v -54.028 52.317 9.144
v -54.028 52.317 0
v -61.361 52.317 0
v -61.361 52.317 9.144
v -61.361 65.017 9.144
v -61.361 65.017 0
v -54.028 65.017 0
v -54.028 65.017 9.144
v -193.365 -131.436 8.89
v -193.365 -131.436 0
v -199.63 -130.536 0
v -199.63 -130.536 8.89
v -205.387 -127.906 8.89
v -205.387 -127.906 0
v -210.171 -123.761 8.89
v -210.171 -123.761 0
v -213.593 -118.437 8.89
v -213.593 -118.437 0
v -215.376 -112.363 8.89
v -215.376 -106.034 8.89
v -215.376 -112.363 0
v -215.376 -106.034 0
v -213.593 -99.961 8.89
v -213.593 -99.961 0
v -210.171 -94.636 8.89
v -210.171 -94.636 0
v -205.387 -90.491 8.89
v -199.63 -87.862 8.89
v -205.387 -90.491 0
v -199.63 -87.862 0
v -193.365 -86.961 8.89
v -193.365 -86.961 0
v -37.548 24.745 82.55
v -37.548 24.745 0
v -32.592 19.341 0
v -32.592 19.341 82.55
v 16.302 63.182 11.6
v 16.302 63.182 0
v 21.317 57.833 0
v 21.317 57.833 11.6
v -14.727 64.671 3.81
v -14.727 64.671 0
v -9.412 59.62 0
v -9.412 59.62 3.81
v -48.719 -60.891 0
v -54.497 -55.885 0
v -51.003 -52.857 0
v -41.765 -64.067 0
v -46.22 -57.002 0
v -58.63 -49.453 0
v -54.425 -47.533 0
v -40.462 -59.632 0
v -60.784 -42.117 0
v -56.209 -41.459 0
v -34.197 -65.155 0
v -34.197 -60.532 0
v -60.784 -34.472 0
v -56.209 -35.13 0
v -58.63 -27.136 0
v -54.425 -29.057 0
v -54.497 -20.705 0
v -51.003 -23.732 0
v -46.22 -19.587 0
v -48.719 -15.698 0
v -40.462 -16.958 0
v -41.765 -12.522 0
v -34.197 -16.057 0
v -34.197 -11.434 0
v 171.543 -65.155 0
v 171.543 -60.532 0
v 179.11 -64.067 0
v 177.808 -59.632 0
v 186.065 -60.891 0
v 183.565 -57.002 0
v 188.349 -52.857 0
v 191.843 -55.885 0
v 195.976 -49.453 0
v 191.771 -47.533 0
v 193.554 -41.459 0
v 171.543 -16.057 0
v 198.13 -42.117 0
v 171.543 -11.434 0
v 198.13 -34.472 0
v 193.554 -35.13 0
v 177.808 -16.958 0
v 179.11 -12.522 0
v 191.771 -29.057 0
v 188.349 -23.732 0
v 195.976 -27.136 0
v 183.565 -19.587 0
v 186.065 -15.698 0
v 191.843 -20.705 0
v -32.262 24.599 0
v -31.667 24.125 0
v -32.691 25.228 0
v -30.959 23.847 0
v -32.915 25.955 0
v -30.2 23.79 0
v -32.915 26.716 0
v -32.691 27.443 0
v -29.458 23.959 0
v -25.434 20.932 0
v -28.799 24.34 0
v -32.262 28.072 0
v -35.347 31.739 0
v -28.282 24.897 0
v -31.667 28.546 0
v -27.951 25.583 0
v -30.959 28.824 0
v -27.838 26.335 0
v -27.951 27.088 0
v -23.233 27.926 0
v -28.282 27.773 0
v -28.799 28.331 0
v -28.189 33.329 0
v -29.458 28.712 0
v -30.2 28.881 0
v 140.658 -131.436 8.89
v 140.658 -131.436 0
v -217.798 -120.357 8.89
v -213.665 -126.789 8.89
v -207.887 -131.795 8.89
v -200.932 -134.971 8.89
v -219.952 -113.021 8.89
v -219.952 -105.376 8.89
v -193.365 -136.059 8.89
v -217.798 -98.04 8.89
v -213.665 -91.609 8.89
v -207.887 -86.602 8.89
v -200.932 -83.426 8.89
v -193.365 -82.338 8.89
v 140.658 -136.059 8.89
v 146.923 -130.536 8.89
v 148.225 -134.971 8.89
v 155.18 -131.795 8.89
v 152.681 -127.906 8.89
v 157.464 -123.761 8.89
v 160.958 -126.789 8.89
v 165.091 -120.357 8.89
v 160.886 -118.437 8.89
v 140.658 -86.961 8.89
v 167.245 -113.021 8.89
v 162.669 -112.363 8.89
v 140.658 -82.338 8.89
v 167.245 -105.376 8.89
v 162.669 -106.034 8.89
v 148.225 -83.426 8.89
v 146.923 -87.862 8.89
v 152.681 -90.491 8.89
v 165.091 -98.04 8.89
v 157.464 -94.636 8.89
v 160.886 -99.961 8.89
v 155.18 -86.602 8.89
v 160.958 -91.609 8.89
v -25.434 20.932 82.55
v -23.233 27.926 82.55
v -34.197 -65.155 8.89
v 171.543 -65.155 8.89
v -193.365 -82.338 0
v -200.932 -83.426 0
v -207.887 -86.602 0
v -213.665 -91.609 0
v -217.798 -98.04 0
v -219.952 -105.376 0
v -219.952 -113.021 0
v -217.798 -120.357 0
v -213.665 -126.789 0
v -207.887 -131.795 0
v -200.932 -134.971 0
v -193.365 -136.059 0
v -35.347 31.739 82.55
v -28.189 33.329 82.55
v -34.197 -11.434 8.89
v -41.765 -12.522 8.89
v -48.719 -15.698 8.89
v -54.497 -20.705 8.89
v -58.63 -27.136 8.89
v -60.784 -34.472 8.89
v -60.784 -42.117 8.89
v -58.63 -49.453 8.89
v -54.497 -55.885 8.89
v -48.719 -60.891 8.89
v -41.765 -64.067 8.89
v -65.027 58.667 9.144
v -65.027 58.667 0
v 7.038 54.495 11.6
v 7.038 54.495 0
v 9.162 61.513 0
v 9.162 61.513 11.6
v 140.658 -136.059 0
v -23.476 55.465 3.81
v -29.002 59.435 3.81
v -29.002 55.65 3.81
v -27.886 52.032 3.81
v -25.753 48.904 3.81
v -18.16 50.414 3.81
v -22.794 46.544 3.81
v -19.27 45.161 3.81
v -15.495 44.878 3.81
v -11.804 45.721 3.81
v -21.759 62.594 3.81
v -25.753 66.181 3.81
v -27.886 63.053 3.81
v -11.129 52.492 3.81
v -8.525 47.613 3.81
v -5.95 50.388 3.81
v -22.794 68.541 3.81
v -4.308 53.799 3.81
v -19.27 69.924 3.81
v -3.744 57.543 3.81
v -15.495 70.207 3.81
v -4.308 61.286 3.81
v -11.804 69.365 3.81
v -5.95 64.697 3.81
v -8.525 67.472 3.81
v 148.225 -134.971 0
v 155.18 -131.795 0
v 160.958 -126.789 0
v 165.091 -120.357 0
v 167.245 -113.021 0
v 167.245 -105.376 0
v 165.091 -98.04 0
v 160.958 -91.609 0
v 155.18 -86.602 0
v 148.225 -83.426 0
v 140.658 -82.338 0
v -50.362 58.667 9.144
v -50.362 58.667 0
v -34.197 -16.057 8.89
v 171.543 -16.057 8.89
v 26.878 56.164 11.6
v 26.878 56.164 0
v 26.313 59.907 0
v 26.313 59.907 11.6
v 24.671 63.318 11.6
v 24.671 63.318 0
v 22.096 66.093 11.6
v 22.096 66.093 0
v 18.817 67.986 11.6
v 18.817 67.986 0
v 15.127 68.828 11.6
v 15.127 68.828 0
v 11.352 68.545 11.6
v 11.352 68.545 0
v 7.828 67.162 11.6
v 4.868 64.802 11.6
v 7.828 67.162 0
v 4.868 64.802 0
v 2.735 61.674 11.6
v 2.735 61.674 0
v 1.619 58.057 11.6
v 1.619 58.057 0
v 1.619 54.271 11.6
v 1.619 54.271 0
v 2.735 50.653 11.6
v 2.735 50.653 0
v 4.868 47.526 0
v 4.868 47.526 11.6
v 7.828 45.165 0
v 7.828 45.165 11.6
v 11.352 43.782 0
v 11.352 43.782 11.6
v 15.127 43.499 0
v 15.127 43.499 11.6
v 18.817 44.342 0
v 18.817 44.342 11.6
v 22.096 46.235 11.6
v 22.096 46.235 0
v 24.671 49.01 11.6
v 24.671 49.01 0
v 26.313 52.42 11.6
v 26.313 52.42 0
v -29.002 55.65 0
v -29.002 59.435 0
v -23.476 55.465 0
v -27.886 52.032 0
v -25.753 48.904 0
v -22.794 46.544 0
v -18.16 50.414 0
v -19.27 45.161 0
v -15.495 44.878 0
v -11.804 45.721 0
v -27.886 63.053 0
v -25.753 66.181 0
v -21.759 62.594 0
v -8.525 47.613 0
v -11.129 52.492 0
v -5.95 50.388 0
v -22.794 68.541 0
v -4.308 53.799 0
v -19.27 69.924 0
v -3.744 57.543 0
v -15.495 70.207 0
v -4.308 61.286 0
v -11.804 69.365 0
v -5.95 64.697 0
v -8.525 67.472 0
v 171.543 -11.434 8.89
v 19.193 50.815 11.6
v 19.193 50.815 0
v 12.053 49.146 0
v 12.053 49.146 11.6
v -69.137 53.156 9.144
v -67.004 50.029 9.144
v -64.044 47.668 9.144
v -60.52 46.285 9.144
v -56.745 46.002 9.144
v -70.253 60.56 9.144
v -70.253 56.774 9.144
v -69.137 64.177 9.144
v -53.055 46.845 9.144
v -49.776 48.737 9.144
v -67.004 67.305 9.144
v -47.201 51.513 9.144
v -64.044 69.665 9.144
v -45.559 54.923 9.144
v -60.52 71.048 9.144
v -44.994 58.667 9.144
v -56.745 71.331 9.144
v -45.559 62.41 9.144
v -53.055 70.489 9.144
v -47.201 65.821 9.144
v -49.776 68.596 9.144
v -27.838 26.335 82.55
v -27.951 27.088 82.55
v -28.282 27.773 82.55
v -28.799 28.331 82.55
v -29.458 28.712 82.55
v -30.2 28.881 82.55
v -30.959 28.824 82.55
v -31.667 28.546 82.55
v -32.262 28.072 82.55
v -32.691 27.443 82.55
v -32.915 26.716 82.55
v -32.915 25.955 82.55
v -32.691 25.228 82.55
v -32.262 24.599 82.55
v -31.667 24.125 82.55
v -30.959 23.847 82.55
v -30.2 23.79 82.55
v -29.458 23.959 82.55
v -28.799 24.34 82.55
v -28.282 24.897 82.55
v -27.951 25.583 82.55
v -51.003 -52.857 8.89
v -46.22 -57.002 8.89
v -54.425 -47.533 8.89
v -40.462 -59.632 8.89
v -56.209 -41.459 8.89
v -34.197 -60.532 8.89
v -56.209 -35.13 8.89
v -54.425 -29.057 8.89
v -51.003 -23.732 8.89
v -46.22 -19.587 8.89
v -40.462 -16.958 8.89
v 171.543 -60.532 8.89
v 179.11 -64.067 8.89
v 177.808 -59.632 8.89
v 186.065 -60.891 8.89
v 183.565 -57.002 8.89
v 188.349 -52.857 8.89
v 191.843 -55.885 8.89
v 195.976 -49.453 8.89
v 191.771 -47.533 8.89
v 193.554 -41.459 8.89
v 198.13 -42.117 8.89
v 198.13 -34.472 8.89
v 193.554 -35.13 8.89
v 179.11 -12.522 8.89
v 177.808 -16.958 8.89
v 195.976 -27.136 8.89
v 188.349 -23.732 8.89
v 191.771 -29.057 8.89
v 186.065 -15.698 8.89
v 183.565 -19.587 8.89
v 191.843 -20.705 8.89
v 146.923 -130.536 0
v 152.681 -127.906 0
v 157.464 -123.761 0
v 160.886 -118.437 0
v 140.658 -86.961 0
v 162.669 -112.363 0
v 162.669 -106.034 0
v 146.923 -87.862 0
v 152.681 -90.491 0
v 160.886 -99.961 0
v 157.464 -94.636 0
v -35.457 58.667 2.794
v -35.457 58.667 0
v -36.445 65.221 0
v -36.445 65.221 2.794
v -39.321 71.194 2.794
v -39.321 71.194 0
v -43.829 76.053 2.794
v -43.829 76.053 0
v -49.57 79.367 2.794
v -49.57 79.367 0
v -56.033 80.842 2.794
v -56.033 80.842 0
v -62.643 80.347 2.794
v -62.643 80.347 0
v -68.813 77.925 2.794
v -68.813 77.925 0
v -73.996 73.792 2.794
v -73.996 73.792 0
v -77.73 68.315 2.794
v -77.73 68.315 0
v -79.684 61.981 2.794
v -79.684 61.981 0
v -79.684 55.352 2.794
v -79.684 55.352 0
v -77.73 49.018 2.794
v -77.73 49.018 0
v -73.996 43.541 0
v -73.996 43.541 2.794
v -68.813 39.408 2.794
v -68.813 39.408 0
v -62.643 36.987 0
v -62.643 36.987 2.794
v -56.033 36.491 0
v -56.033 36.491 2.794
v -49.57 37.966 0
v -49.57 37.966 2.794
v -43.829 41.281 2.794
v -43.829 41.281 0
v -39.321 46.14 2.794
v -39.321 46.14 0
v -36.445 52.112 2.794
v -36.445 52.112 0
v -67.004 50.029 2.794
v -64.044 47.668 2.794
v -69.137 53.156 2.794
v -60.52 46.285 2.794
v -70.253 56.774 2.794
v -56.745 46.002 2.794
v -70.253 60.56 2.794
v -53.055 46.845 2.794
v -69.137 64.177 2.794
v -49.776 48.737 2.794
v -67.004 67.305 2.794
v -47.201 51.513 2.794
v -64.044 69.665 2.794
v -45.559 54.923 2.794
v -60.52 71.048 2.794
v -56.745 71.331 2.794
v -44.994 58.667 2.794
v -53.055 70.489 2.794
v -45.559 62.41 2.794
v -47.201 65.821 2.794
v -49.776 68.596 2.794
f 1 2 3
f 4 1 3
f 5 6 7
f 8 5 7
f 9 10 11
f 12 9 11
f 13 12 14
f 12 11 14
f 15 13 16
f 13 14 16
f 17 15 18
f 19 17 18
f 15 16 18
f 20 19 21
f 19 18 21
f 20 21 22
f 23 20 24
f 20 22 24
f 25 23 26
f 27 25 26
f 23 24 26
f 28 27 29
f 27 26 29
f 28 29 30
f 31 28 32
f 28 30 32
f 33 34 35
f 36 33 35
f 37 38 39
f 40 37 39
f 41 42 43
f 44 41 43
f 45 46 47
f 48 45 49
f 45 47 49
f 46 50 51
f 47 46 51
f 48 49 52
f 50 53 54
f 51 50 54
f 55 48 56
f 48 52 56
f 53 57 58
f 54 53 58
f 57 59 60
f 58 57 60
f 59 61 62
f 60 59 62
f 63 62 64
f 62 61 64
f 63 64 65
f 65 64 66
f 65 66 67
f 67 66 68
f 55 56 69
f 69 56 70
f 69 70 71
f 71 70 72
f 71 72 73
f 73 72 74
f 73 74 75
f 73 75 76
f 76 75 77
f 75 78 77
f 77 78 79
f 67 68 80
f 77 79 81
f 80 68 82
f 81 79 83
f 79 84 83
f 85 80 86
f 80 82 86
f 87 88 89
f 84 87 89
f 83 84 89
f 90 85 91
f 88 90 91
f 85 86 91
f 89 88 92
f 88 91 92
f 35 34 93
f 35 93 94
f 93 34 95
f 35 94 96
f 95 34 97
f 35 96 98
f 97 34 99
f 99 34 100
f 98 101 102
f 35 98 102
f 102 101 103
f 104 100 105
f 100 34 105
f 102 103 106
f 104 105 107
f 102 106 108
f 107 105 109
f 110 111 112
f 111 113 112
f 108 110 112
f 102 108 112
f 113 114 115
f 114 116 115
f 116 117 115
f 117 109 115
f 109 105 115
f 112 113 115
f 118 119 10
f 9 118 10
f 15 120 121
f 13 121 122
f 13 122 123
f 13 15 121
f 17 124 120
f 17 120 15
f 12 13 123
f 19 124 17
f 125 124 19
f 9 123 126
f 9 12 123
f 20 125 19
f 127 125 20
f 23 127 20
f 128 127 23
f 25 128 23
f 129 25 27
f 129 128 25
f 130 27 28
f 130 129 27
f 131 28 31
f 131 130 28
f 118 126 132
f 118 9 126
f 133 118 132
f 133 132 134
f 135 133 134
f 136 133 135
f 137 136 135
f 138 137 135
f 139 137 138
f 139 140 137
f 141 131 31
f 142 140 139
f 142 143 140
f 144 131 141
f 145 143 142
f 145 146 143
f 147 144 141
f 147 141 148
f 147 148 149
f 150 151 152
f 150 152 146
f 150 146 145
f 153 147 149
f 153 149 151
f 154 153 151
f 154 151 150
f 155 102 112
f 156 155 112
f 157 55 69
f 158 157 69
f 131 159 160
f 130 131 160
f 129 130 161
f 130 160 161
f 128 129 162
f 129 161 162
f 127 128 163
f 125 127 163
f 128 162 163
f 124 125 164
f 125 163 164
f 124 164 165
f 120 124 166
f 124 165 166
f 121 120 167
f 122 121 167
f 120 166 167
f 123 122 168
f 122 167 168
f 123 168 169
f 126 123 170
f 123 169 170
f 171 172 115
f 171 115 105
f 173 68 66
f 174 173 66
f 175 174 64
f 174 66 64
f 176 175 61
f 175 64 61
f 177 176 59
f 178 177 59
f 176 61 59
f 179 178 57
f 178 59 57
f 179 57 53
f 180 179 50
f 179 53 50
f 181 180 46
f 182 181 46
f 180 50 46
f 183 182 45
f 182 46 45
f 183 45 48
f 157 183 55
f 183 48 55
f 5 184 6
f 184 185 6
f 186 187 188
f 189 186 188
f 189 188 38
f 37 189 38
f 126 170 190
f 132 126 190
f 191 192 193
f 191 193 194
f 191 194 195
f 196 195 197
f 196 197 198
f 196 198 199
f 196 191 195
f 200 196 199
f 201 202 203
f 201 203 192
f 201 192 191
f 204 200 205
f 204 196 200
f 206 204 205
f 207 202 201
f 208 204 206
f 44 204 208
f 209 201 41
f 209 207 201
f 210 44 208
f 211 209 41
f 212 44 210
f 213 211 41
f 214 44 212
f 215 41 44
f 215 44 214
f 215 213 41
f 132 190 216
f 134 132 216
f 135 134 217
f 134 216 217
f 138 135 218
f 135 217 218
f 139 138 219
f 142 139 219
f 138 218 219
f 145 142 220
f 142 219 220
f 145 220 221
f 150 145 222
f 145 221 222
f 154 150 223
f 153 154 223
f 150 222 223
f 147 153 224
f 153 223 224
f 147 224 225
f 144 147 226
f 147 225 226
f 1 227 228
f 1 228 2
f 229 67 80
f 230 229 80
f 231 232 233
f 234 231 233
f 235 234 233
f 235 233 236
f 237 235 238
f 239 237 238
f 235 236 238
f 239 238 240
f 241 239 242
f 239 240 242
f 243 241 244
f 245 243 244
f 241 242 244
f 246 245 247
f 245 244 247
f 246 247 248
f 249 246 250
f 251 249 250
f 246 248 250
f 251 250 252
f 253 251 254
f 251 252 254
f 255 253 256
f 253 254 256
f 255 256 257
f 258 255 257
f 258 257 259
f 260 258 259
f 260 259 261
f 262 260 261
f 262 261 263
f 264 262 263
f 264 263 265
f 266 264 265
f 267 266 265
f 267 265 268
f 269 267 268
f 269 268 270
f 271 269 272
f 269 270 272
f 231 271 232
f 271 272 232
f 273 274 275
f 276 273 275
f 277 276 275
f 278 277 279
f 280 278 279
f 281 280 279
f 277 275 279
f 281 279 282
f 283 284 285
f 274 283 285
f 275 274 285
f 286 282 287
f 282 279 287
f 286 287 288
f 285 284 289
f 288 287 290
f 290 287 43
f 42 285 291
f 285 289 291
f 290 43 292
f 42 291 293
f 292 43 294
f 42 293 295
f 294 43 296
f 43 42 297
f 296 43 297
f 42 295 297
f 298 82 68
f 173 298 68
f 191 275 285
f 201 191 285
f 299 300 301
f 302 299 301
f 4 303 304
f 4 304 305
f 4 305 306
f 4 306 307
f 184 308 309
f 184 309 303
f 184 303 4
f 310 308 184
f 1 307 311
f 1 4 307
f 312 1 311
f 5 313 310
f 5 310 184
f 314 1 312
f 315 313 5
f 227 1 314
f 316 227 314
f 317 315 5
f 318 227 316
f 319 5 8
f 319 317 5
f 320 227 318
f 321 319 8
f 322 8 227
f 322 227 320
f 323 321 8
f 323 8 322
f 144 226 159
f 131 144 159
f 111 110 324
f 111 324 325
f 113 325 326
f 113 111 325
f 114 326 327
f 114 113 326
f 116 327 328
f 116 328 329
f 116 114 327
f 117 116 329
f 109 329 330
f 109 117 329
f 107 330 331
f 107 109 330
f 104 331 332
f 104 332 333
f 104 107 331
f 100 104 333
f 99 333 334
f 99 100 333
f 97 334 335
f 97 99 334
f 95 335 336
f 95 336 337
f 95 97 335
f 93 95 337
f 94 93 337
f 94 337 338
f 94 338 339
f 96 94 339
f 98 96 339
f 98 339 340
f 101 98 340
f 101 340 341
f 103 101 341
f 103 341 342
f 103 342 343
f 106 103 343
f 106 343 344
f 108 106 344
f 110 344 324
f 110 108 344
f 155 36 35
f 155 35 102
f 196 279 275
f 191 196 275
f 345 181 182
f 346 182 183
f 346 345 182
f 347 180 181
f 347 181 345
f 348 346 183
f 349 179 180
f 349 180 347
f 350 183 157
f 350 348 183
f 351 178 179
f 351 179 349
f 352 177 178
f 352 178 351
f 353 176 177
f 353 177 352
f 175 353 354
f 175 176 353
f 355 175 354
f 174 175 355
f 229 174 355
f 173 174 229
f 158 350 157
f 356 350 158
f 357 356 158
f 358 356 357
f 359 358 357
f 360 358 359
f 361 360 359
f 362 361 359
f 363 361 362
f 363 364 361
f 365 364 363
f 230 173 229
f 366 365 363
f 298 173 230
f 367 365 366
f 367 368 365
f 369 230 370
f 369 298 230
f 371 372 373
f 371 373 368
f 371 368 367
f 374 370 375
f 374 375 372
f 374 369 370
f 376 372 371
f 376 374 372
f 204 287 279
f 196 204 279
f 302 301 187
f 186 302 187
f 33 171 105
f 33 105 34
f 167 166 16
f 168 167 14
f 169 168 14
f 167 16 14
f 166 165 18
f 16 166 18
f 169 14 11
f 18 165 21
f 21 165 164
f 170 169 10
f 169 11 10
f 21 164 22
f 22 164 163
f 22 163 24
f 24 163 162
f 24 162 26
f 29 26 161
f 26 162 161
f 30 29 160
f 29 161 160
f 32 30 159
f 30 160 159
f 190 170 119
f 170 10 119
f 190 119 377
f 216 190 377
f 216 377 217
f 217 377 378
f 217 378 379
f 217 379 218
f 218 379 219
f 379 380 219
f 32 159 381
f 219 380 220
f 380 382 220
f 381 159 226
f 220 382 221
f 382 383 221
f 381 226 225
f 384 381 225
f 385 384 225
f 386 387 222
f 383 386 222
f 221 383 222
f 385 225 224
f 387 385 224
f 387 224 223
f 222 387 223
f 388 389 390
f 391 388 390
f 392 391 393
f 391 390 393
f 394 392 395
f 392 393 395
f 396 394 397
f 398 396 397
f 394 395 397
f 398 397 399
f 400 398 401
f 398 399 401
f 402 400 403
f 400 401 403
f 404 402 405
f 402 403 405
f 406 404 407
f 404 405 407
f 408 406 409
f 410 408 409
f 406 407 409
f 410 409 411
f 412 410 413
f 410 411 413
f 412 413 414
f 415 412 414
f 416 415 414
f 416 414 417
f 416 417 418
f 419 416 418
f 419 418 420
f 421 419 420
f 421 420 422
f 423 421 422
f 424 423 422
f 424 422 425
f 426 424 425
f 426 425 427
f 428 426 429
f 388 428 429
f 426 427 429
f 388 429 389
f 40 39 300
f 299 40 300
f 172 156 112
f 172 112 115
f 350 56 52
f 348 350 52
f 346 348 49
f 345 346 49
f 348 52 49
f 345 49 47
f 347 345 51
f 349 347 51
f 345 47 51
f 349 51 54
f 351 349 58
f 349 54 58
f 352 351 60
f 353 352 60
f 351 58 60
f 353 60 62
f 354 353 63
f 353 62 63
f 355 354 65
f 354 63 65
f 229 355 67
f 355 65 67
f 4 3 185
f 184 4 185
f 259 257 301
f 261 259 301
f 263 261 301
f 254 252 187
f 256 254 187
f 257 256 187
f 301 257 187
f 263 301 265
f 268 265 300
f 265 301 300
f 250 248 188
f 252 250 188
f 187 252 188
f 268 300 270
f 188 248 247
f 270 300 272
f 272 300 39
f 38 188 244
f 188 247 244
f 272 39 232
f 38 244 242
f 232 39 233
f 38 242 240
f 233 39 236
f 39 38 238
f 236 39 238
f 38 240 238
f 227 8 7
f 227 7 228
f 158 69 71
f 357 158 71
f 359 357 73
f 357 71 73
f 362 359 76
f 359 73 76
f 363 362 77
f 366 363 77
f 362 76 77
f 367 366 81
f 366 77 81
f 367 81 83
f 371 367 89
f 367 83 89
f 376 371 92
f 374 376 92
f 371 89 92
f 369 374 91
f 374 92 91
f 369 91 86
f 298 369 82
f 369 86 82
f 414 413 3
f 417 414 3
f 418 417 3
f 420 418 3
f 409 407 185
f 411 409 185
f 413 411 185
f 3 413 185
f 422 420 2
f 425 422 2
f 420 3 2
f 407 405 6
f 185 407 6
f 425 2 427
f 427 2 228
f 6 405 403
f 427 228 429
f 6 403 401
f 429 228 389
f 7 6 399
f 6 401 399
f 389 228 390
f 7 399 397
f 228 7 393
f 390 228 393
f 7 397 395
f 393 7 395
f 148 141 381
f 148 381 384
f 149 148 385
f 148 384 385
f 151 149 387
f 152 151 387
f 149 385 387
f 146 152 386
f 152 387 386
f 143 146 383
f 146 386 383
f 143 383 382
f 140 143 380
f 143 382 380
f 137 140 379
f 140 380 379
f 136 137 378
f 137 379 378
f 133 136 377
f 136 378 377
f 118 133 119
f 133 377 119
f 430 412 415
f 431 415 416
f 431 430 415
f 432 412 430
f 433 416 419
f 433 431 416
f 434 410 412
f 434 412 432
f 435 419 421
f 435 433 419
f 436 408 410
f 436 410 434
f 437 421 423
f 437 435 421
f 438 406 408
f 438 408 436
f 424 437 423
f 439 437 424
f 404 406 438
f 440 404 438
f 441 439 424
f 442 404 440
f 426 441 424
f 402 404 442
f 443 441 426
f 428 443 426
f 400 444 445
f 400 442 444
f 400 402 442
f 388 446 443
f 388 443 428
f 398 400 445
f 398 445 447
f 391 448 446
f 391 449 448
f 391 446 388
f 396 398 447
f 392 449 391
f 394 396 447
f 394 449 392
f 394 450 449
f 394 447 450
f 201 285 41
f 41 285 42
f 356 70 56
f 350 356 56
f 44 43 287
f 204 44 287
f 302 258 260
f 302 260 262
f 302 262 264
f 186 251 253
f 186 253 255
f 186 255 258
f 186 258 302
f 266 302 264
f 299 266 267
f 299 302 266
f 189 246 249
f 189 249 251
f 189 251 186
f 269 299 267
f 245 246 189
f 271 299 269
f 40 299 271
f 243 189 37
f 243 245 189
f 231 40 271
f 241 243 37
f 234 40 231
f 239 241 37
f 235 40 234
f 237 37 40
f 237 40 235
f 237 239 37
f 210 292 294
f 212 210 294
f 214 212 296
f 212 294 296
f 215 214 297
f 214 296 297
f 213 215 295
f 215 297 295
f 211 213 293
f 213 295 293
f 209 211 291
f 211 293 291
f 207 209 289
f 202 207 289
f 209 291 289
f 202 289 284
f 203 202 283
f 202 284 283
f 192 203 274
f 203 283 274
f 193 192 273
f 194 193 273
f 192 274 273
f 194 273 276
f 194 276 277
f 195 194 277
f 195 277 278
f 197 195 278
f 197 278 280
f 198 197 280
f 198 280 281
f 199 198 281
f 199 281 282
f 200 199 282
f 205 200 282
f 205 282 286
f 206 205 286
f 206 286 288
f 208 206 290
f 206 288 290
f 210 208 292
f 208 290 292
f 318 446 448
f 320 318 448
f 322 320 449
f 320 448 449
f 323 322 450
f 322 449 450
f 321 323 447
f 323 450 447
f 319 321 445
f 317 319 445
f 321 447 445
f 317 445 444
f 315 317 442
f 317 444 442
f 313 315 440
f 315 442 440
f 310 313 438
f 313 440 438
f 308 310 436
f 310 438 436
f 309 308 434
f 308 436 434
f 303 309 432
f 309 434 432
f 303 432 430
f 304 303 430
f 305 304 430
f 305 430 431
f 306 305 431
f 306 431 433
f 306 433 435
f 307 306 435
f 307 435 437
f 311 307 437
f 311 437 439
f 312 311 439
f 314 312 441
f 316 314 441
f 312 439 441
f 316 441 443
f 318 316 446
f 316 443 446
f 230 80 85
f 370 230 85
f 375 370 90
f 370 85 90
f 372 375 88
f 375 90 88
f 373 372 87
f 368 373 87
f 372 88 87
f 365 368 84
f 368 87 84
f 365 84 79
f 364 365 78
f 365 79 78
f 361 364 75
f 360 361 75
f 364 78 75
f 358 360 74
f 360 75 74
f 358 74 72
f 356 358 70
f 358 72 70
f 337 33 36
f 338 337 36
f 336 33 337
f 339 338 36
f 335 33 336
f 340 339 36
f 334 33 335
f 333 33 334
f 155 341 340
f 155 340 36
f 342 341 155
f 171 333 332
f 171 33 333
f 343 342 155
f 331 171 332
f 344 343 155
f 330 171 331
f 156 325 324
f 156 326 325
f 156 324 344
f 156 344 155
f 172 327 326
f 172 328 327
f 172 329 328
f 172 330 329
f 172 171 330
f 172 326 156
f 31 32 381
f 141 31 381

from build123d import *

# Parameters (mm, degrees)
F0_R      = 22.2377
F1_DEPTH  = 2.794
F2_R      = 12.7
F3_DEPTH  = 6.35
F4_R      = 12.7
F5_DEPTH  = 3.81
F6_R      = 2.5527
F7_DEPTH  = 82.55
F8_R      = 12.7
F9_DEPTH  = 11.60018
F11_DEPTH = 8.89
F12_DEPTH = 8.89


with BuildPart() as f1:
    # F0 (on Top) → F1 (new body)
    with BuildSketch(Plane.XY):
        with Locations((-57.694379, 58.666699)):
            Circle(F0_R)
        Polygon((-50.362031, 58.666699), (-54.028205, 52.316699), (-61.360553, 52.316699), (-65.026728, 58.666699), (-61.360553, 65.016699), (-54.028205, 65.016699), align=None, mode=Mode.SUBTRACT)
    extrude(amount=F1_DEPTH)

    # F2 (on face) → F3 (join)
    with BuildSketch(Plane.XY.offset(2.794)):
        with Locations((-57.694379, 58.666699)):
            Circle(F2_R)
        Polygon((-65.026728, 58.666699), (-61.360553, 65.016699), (-54.028205, 65.016699), (-50.362031, 58.666699), (-54.028205, 52.316699), (-61.360553, 52.316699), align=None, mode=Mode.SUBTRACT)
    extrude(amount=F3_DEPTH)


with BuildPart() as f5:
    # F4 (on Top) → F5 (new body)
    with BuildSketch(Plane.XY):
        with Locations((-16.443703, 57.542652)):
            Circle(F4_R)
        Polygon((-9.411851, 59.620244), (-11.12853, 52.491685), (-18.160382, 50.414093), (-23.475555, 55.46506), (-21.758877, 62.593618), (-14.727025, 64.671211), align=None, mode=Mode.SUBTRACT)
    extrude(amount=F5_DEPTH)


with BuildPart() as f7:
    # F6 (on Top) → F7 (new body)
    with BuildSketch(Plane.XY):
        Polygon((-32.592089, 19.341193), (-25.434346, 20.931805), (-23.232985, 27.925899), (-28.189367, 33.32938), (-35.34711, 31.738768), (-37.548471, 24.744674), align=None)
        with Locations((-30.390728, 26.335286)):
            Circle(F6_R, mode=Mode.SUBTRACT)
    extrude(amount=F7_DEPTH)


with BuildPart() as f9:
    # F8 (on Top) → F9 (new body)
    with BuildSketch(Plane.XY):
        with Locations((14.177629, 56.163803)):
            Circle(F8_R)
        Polygon((21.317488, 57.832859), (19.193004, 50.815032), (12.053145, 49.145976), (7.03777, 54.494747), (9.162255, 61.512574), (16.302113, 63.18163), align=None, mode=Mode.SUBTRACT)
    extrude(amount=F9_DEPTH)


with BuildPart() as f11:
    # F10 (on Top) → F11 (new body)
    with BuildSketch(Plane.XY):
        with BuildLine():
            Line((171.542774, -11.434188), (-34.197226, -11.434188))
            ThreePointArc((-34.197226, -11.434188), (-61.057726, -38.294688), (-34.197226, -65.155188))
            Line((-34.197226, -65.155188), (171.542774, -65.155188))
            ThreePointArc((171.542774, -65.155188), (198.403274, -38.294688), (171.542774, -11.434188))
        make_face()
        with BuildLine():
            Line((171.542774, -60.532388), (-34.197226, -60.532388))
            ThreePointArc((-34.197226, -60.532388), (-56.434926, -38.294688), (-34.197226, -16.056988))
            Line((-34.197226, -16.056988), (171.542774, -16.056988))
            ThreePointArc((171.542774, -16.056988), (193.780474, -38.294688), (171.542774, -60.532388))
        make_face(mode=Mode.SUBTRACT)
    extrude(amount=F11_DEPTH)


with BuildPart() as f12:
    # F10 (on Top) → F12 (new body)
    with BuildSketch(Plane.XY):
        with BuildLine():
            ThreePointArc((-193.364752, -82.338208), (-220.225252, -109.198708), (-193.364752, -136.059208))
            Line((-193.364752, -136.059208), (140.657948, -136.059208))
            ThreePointArc((140.657948, -136.059208), (167.518448, -109.198708), (140.657948, -82.338208))
            Line((140.657948, -82.338208), (-193.364752, -82.338208))
        make_face()
        with BuildLine():
            Line((140.657948, -131.436408), (-193.364752, -131.436408))
            ThreePointArc((-193.364752, -131.436408), (-215.602452, -109.198708), (-193.364752, -86.961008))
            Line((-193.364752, -86.961008), (140.657948, -86.961008))
            ThreePointArc((140.657948, -86.961008), (162.895648, -109.198708), (140.657948, -131.436408))
        make_face(mode=Mode.SUBTRACT)
    extrude(amount=F12_DEPTH)


solid = Compound([f1.part, f5.part, f7.part, f9.part, f11.part, f12.part])
